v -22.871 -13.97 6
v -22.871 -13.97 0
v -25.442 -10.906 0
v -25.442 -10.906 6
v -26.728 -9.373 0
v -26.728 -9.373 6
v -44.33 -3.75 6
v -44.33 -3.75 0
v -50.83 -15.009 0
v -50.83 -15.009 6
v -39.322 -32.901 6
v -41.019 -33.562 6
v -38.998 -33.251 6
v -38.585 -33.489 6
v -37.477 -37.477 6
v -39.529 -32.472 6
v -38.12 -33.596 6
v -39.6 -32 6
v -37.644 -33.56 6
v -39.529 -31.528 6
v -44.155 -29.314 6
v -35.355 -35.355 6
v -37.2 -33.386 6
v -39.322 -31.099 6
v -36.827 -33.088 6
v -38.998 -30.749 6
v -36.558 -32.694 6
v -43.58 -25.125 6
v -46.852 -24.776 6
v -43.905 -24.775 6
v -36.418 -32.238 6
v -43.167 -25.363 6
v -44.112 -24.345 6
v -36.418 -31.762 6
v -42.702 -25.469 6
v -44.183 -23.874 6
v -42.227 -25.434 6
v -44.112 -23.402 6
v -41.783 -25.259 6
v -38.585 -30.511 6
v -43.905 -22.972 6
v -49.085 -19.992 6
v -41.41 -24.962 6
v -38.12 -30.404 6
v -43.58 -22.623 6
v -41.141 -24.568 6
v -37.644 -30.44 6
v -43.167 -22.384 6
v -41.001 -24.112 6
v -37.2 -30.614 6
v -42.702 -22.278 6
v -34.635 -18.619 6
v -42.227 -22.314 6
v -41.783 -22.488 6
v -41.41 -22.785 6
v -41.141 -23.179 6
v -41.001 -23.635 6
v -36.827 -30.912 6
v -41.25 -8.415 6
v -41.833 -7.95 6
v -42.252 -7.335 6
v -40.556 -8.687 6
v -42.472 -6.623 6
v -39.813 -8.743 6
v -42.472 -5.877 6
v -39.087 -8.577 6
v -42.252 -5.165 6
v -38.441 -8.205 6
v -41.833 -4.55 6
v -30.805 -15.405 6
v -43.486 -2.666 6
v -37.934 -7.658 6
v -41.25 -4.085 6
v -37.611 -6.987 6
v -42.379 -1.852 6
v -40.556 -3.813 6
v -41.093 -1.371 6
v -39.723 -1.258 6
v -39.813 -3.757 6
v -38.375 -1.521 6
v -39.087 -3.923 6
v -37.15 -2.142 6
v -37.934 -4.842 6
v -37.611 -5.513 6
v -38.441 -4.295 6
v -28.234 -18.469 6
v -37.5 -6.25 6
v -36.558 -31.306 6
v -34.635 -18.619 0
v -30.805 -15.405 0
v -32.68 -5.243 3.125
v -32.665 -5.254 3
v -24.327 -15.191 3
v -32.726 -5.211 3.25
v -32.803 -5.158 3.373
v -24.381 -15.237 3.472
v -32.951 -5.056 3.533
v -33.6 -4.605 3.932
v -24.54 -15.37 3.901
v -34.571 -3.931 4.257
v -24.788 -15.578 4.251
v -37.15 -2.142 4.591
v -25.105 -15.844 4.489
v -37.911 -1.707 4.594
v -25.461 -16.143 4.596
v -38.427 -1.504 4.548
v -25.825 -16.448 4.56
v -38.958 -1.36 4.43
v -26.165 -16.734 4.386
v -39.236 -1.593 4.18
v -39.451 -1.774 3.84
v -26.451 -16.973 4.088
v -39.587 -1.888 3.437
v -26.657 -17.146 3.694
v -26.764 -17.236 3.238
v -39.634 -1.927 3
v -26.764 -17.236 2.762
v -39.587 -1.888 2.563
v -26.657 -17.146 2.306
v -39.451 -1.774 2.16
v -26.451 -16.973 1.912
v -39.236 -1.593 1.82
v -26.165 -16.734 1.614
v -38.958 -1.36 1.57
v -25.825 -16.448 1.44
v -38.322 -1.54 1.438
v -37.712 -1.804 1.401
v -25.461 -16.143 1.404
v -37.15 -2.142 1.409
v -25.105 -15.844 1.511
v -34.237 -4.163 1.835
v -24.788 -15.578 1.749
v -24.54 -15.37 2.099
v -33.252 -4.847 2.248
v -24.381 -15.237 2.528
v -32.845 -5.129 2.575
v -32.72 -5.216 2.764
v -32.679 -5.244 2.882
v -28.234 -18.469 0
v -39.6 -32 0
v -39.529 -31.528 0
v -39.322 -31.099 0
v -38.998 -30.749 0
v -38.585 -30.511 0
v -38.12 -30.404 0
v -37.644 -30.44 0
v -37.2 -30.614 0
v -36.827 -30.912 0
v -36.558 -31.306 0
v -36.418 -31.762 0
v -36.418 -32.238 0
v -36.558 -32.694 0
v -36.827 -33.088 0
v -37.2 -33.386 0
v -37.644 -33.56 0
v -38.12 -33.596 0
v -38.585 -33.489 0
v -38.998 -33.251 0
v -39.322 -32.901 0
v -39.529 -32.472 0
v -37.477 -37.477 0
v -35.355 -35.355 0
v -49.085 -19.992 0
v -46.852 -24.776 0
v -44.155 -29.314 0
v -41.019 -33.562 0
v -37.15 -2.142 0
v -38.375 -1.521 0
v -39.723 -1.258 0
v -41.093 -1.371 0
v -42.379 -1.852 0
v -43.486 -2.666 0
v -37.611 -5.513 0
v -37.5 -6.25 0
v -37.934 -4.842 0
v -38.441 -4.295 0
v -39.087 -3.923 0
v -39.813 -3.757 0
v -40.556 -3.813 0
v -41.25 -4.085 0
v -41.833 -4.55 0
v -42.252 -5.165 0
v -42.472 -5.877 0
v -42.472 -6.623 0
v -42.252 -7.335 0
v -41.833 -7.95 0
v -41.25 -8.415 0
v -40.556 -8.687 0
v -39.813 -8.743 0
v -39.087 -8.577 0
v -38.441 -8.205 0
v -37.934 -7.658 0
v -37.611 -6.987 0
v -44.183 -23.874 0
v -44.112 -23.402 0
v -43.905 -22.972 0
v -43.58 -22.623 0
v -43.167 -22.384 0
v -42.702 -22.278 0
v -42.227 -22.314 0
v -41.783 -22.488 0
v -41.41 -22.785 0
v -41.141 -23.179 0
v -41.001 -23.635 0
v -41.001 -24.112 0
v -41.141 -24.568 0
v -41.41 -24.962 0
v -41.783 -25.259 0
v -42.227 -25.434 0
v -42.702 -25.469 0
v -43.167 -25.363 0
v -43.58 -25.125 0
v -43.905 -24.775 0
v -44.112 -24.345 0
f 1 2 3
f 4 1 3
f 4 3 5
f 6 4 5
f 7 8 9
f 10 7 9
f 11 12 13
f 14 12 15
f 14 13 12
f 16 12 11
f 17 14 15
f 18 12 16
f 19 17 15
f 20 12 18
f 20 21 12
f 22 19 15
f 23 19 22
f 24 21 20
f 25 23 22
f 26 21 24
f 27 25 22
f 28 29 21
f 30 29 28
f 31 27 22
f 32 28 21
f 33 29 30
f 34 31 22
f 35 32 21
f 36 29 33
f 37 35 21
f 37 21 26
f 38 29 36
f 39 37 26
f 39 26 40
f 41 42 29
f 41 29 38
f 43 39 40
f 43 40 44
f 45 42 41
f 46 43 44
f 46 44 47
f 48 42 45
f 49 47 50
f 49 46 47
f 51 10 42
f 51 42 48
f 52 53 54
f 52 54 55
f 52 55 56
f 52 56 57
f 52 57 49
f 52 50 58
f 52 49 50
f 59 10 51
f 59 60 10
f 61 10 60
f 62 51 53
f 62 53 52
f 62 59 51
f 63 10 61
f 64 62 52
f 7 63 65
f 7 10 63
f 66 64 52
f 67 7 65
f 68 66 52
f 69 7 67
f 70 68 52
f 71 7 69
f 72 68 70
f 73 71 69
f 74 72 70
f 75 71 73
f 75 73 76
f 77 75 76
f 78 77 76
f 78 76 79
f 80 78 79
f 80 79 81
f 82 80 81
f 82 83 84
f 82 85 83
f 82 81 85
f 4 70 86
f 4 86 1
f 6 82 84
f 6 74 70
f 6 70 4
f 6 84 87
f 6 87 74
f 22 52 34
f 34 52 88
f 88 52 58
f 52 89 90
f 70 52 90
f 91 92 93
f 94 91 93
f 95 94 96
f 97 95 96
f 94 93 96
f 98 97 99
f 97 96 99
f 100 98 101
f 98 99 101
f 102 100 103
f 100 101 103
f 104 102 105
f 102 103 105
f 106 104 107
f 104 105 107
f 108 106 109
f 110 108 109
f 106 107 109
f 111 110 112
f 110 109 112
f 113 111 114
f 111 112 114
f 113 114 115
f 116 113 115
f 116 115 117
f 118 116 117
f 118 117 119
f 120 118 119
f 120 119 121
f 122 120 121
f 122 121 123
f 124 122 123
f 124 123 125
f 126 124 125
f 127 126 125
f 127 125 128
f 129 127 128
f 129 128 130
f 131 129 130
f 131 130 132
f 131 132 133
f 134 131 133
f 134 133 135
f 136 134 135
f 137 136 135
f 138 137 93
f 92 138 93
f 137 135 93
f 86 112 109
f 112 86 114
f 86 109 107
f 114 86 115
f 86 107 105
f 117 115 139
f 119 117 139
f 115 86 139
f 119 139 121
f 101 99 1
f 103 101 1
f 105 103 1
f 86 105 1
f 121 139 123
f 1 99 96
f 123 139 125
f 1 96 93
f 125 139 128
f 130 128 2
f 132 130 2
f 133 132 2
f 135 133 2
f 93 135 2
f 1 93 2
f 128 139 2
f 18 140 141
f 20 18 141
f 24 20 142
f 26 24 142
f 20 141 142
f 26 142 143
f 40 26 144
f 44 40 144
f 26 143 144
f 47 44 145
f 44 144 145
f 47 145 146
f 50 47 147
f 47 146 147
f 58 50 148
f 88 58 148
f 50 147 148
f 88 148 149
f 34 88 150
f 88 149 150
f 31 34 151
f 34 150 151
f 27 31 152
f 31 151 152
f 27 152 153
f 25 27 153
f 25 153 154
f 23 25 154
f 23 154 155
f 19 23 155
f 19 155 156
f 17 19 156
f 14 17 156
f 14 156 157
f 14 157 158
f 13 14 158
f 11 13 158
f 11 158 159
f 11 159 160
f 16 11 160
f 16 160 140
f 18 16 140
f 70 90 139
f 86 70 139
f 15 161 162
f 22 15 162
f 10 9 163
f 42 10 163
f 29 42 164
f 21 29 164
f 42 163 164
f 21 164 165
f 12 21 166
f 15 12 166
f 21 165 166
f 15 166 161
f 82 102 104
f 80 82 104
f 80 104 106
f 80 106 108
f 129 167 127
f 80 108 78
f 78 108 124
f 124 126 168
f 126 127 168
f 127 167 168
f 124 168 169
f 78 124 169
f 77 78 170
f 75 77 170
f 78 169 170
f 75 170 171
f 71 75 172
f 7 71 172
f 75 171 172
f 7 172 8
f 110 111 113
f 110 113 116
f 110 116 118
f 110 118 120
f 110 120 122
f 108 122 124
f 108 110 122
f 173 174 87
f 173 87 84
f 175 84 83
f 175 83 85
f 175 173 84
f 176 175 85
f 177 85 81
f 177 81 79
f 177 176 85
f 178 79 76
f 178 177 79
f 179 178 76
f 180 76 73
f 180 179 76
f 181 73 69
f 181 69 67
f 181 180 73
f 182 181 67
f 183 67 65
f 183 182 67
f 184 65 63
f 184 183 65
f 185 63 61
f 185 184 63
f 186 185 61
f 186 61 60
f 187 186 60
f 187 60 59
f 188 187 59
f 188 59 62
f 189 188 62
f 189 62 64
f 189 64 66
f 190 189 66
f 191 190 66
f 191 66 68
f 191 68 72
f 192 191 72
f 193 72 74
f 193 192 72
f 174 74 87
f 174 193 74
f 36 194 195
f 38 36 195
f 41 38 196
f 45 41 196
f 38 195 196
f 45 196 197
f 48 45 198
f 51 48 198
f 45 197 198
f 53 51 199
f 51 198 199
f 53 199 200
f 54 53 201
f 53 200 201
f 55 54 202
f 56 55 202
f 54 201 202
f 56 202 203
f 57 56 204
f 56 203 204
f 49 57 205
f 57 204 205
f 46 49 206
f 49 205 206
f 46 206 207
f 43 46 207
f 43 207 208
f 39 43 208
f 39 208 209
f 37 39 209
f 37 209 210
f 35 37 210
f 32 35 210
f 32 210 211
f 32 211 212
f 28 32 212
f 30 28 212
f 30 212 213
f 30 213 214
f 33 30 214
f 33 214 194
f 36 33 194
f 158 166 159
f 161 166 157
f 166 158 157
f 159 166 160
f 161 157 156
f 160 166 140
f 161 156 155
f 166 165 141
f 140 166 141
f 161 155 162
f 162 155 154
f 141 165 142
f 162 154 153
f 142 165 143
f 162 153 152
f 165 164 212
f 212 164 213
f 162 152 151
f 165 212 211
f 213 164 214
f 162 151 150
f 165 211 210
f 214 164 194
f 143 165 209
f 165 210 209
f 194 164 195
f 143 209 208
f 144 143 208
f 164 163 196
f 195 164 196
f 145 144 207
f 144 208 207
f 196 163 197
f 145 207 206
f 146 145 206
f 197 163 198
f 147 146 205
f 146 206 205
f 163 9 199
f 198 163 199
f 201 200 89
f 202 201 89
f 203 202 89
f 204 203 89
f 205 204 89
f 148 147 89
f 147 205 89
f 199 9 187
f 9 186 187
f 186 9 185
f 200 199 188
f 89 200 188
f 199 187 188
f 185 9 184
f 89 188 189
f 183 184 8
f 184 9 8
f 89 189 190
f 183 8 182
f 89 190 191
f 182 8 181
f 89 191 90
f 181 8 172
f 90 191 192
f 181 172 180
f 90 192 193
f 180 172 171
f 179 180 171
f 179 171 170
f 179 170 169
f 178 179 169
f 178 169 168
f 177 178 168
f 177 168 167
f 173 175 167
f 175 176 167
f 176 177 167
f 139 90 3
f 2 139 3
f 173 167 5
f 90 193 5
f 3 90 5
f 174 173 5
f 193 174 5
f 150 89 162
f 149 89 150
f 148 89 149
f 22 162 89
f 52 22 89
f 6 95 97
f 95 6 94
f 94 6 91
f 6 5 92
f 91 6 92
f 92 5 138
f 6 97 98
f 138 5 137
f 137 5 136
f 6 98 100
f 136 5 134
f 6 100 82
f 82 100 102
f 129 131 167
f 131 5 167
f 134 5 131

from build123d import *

# Parameters (mm, degrees)
SKETCH_2_R          = 2.5
EXTRUDE_1_DEPTH     = 6
SKETCH_3_R          = 1.6
CUT_EXTRUDE_1_DEPTH = 10
SKETCH_4_R          = 1.6
CUT_EXTRUDE_2_DEPTH = 20


with BuildPart() as part:
    # 草图2 → 凸台-拉伸1 (new body)
    with BuildSketch(Plane.XY):
        with BuildLine():
            Line((-37.476659403, -37.476659403), (-35.355339059, -35.355339059))
            Line((-35.355339059, -35.355339059), (-34.635011938, -18.618967428))
            Line((-34.635011938, -18.618967428), (-30.804789722, -15.40502938))
            Line((-30.804789722, -15.40502938), (-28.233639283, -18.469207152))
            Line((-28.233639283, -18.469207152), (-22.871328181, -13.969693884))
            Line((-22.871328181, -13.969693884), (-25.44247862, -10.905516112))
            Line((-25.44247862, -10.905516112), (-26.72805384, -9.373427226))
            Line((-26.72805384, -9.373427226), (-37.149566653, -2.1420772))
            ThreePointArc((-37.149566653, -2.1420772), (-41.092578269, -1.370832784), (-44.330127019, -3.75))
            Line((-44.330127019, -3.75), (-50.830440783, -15.008873704))
            ThreePointArc((-50.830440783, -15.008873704), (-45.560249498, -27.07884166), (-37.476659403, -37.476659403))
        make_face()
        with Locations((-40, -6.25)):
            Circle(SKETCH_2_R, mode=Mode.SUBTRACT)
    extrude(amount=EXTRUDE_1_DEPTH)

    # 草图3 → 切除-拉伸1 (cut)
    with BuildSketch(Plane(origin=(0, 0, 0), x_dir=(-1, 0, 0), z_dir=(0, 0, -1))):
        with Locations((42.582783582, -23.873668727)):
            Circle(SKETCH_3_R)
        with Locations((38, -32)):
            Circle(SKETCH_3_R)
    extrude(amount=-CUT_EXTRUDE_1_DEPTH, mode=Mode.SUBTRACT)

    # 草图4 → 切除-拉伸2 (cut)
    with BuildSketch(Plane(origin=(-2.571150439, 3.064177772, 0), x_dir=(0.7660444431189767, 0.642787609686541, 0), z_dir=(0.642787609686541, -0.7660444431189767, 0))):
        with Locations((-30, 3)):
            Circle(SKETCH_4_R)
    extrude(amount=-CUT_EXTRUDE_2_DEPTH, mode=Mode.SUBTRACT)


solid = part.part
